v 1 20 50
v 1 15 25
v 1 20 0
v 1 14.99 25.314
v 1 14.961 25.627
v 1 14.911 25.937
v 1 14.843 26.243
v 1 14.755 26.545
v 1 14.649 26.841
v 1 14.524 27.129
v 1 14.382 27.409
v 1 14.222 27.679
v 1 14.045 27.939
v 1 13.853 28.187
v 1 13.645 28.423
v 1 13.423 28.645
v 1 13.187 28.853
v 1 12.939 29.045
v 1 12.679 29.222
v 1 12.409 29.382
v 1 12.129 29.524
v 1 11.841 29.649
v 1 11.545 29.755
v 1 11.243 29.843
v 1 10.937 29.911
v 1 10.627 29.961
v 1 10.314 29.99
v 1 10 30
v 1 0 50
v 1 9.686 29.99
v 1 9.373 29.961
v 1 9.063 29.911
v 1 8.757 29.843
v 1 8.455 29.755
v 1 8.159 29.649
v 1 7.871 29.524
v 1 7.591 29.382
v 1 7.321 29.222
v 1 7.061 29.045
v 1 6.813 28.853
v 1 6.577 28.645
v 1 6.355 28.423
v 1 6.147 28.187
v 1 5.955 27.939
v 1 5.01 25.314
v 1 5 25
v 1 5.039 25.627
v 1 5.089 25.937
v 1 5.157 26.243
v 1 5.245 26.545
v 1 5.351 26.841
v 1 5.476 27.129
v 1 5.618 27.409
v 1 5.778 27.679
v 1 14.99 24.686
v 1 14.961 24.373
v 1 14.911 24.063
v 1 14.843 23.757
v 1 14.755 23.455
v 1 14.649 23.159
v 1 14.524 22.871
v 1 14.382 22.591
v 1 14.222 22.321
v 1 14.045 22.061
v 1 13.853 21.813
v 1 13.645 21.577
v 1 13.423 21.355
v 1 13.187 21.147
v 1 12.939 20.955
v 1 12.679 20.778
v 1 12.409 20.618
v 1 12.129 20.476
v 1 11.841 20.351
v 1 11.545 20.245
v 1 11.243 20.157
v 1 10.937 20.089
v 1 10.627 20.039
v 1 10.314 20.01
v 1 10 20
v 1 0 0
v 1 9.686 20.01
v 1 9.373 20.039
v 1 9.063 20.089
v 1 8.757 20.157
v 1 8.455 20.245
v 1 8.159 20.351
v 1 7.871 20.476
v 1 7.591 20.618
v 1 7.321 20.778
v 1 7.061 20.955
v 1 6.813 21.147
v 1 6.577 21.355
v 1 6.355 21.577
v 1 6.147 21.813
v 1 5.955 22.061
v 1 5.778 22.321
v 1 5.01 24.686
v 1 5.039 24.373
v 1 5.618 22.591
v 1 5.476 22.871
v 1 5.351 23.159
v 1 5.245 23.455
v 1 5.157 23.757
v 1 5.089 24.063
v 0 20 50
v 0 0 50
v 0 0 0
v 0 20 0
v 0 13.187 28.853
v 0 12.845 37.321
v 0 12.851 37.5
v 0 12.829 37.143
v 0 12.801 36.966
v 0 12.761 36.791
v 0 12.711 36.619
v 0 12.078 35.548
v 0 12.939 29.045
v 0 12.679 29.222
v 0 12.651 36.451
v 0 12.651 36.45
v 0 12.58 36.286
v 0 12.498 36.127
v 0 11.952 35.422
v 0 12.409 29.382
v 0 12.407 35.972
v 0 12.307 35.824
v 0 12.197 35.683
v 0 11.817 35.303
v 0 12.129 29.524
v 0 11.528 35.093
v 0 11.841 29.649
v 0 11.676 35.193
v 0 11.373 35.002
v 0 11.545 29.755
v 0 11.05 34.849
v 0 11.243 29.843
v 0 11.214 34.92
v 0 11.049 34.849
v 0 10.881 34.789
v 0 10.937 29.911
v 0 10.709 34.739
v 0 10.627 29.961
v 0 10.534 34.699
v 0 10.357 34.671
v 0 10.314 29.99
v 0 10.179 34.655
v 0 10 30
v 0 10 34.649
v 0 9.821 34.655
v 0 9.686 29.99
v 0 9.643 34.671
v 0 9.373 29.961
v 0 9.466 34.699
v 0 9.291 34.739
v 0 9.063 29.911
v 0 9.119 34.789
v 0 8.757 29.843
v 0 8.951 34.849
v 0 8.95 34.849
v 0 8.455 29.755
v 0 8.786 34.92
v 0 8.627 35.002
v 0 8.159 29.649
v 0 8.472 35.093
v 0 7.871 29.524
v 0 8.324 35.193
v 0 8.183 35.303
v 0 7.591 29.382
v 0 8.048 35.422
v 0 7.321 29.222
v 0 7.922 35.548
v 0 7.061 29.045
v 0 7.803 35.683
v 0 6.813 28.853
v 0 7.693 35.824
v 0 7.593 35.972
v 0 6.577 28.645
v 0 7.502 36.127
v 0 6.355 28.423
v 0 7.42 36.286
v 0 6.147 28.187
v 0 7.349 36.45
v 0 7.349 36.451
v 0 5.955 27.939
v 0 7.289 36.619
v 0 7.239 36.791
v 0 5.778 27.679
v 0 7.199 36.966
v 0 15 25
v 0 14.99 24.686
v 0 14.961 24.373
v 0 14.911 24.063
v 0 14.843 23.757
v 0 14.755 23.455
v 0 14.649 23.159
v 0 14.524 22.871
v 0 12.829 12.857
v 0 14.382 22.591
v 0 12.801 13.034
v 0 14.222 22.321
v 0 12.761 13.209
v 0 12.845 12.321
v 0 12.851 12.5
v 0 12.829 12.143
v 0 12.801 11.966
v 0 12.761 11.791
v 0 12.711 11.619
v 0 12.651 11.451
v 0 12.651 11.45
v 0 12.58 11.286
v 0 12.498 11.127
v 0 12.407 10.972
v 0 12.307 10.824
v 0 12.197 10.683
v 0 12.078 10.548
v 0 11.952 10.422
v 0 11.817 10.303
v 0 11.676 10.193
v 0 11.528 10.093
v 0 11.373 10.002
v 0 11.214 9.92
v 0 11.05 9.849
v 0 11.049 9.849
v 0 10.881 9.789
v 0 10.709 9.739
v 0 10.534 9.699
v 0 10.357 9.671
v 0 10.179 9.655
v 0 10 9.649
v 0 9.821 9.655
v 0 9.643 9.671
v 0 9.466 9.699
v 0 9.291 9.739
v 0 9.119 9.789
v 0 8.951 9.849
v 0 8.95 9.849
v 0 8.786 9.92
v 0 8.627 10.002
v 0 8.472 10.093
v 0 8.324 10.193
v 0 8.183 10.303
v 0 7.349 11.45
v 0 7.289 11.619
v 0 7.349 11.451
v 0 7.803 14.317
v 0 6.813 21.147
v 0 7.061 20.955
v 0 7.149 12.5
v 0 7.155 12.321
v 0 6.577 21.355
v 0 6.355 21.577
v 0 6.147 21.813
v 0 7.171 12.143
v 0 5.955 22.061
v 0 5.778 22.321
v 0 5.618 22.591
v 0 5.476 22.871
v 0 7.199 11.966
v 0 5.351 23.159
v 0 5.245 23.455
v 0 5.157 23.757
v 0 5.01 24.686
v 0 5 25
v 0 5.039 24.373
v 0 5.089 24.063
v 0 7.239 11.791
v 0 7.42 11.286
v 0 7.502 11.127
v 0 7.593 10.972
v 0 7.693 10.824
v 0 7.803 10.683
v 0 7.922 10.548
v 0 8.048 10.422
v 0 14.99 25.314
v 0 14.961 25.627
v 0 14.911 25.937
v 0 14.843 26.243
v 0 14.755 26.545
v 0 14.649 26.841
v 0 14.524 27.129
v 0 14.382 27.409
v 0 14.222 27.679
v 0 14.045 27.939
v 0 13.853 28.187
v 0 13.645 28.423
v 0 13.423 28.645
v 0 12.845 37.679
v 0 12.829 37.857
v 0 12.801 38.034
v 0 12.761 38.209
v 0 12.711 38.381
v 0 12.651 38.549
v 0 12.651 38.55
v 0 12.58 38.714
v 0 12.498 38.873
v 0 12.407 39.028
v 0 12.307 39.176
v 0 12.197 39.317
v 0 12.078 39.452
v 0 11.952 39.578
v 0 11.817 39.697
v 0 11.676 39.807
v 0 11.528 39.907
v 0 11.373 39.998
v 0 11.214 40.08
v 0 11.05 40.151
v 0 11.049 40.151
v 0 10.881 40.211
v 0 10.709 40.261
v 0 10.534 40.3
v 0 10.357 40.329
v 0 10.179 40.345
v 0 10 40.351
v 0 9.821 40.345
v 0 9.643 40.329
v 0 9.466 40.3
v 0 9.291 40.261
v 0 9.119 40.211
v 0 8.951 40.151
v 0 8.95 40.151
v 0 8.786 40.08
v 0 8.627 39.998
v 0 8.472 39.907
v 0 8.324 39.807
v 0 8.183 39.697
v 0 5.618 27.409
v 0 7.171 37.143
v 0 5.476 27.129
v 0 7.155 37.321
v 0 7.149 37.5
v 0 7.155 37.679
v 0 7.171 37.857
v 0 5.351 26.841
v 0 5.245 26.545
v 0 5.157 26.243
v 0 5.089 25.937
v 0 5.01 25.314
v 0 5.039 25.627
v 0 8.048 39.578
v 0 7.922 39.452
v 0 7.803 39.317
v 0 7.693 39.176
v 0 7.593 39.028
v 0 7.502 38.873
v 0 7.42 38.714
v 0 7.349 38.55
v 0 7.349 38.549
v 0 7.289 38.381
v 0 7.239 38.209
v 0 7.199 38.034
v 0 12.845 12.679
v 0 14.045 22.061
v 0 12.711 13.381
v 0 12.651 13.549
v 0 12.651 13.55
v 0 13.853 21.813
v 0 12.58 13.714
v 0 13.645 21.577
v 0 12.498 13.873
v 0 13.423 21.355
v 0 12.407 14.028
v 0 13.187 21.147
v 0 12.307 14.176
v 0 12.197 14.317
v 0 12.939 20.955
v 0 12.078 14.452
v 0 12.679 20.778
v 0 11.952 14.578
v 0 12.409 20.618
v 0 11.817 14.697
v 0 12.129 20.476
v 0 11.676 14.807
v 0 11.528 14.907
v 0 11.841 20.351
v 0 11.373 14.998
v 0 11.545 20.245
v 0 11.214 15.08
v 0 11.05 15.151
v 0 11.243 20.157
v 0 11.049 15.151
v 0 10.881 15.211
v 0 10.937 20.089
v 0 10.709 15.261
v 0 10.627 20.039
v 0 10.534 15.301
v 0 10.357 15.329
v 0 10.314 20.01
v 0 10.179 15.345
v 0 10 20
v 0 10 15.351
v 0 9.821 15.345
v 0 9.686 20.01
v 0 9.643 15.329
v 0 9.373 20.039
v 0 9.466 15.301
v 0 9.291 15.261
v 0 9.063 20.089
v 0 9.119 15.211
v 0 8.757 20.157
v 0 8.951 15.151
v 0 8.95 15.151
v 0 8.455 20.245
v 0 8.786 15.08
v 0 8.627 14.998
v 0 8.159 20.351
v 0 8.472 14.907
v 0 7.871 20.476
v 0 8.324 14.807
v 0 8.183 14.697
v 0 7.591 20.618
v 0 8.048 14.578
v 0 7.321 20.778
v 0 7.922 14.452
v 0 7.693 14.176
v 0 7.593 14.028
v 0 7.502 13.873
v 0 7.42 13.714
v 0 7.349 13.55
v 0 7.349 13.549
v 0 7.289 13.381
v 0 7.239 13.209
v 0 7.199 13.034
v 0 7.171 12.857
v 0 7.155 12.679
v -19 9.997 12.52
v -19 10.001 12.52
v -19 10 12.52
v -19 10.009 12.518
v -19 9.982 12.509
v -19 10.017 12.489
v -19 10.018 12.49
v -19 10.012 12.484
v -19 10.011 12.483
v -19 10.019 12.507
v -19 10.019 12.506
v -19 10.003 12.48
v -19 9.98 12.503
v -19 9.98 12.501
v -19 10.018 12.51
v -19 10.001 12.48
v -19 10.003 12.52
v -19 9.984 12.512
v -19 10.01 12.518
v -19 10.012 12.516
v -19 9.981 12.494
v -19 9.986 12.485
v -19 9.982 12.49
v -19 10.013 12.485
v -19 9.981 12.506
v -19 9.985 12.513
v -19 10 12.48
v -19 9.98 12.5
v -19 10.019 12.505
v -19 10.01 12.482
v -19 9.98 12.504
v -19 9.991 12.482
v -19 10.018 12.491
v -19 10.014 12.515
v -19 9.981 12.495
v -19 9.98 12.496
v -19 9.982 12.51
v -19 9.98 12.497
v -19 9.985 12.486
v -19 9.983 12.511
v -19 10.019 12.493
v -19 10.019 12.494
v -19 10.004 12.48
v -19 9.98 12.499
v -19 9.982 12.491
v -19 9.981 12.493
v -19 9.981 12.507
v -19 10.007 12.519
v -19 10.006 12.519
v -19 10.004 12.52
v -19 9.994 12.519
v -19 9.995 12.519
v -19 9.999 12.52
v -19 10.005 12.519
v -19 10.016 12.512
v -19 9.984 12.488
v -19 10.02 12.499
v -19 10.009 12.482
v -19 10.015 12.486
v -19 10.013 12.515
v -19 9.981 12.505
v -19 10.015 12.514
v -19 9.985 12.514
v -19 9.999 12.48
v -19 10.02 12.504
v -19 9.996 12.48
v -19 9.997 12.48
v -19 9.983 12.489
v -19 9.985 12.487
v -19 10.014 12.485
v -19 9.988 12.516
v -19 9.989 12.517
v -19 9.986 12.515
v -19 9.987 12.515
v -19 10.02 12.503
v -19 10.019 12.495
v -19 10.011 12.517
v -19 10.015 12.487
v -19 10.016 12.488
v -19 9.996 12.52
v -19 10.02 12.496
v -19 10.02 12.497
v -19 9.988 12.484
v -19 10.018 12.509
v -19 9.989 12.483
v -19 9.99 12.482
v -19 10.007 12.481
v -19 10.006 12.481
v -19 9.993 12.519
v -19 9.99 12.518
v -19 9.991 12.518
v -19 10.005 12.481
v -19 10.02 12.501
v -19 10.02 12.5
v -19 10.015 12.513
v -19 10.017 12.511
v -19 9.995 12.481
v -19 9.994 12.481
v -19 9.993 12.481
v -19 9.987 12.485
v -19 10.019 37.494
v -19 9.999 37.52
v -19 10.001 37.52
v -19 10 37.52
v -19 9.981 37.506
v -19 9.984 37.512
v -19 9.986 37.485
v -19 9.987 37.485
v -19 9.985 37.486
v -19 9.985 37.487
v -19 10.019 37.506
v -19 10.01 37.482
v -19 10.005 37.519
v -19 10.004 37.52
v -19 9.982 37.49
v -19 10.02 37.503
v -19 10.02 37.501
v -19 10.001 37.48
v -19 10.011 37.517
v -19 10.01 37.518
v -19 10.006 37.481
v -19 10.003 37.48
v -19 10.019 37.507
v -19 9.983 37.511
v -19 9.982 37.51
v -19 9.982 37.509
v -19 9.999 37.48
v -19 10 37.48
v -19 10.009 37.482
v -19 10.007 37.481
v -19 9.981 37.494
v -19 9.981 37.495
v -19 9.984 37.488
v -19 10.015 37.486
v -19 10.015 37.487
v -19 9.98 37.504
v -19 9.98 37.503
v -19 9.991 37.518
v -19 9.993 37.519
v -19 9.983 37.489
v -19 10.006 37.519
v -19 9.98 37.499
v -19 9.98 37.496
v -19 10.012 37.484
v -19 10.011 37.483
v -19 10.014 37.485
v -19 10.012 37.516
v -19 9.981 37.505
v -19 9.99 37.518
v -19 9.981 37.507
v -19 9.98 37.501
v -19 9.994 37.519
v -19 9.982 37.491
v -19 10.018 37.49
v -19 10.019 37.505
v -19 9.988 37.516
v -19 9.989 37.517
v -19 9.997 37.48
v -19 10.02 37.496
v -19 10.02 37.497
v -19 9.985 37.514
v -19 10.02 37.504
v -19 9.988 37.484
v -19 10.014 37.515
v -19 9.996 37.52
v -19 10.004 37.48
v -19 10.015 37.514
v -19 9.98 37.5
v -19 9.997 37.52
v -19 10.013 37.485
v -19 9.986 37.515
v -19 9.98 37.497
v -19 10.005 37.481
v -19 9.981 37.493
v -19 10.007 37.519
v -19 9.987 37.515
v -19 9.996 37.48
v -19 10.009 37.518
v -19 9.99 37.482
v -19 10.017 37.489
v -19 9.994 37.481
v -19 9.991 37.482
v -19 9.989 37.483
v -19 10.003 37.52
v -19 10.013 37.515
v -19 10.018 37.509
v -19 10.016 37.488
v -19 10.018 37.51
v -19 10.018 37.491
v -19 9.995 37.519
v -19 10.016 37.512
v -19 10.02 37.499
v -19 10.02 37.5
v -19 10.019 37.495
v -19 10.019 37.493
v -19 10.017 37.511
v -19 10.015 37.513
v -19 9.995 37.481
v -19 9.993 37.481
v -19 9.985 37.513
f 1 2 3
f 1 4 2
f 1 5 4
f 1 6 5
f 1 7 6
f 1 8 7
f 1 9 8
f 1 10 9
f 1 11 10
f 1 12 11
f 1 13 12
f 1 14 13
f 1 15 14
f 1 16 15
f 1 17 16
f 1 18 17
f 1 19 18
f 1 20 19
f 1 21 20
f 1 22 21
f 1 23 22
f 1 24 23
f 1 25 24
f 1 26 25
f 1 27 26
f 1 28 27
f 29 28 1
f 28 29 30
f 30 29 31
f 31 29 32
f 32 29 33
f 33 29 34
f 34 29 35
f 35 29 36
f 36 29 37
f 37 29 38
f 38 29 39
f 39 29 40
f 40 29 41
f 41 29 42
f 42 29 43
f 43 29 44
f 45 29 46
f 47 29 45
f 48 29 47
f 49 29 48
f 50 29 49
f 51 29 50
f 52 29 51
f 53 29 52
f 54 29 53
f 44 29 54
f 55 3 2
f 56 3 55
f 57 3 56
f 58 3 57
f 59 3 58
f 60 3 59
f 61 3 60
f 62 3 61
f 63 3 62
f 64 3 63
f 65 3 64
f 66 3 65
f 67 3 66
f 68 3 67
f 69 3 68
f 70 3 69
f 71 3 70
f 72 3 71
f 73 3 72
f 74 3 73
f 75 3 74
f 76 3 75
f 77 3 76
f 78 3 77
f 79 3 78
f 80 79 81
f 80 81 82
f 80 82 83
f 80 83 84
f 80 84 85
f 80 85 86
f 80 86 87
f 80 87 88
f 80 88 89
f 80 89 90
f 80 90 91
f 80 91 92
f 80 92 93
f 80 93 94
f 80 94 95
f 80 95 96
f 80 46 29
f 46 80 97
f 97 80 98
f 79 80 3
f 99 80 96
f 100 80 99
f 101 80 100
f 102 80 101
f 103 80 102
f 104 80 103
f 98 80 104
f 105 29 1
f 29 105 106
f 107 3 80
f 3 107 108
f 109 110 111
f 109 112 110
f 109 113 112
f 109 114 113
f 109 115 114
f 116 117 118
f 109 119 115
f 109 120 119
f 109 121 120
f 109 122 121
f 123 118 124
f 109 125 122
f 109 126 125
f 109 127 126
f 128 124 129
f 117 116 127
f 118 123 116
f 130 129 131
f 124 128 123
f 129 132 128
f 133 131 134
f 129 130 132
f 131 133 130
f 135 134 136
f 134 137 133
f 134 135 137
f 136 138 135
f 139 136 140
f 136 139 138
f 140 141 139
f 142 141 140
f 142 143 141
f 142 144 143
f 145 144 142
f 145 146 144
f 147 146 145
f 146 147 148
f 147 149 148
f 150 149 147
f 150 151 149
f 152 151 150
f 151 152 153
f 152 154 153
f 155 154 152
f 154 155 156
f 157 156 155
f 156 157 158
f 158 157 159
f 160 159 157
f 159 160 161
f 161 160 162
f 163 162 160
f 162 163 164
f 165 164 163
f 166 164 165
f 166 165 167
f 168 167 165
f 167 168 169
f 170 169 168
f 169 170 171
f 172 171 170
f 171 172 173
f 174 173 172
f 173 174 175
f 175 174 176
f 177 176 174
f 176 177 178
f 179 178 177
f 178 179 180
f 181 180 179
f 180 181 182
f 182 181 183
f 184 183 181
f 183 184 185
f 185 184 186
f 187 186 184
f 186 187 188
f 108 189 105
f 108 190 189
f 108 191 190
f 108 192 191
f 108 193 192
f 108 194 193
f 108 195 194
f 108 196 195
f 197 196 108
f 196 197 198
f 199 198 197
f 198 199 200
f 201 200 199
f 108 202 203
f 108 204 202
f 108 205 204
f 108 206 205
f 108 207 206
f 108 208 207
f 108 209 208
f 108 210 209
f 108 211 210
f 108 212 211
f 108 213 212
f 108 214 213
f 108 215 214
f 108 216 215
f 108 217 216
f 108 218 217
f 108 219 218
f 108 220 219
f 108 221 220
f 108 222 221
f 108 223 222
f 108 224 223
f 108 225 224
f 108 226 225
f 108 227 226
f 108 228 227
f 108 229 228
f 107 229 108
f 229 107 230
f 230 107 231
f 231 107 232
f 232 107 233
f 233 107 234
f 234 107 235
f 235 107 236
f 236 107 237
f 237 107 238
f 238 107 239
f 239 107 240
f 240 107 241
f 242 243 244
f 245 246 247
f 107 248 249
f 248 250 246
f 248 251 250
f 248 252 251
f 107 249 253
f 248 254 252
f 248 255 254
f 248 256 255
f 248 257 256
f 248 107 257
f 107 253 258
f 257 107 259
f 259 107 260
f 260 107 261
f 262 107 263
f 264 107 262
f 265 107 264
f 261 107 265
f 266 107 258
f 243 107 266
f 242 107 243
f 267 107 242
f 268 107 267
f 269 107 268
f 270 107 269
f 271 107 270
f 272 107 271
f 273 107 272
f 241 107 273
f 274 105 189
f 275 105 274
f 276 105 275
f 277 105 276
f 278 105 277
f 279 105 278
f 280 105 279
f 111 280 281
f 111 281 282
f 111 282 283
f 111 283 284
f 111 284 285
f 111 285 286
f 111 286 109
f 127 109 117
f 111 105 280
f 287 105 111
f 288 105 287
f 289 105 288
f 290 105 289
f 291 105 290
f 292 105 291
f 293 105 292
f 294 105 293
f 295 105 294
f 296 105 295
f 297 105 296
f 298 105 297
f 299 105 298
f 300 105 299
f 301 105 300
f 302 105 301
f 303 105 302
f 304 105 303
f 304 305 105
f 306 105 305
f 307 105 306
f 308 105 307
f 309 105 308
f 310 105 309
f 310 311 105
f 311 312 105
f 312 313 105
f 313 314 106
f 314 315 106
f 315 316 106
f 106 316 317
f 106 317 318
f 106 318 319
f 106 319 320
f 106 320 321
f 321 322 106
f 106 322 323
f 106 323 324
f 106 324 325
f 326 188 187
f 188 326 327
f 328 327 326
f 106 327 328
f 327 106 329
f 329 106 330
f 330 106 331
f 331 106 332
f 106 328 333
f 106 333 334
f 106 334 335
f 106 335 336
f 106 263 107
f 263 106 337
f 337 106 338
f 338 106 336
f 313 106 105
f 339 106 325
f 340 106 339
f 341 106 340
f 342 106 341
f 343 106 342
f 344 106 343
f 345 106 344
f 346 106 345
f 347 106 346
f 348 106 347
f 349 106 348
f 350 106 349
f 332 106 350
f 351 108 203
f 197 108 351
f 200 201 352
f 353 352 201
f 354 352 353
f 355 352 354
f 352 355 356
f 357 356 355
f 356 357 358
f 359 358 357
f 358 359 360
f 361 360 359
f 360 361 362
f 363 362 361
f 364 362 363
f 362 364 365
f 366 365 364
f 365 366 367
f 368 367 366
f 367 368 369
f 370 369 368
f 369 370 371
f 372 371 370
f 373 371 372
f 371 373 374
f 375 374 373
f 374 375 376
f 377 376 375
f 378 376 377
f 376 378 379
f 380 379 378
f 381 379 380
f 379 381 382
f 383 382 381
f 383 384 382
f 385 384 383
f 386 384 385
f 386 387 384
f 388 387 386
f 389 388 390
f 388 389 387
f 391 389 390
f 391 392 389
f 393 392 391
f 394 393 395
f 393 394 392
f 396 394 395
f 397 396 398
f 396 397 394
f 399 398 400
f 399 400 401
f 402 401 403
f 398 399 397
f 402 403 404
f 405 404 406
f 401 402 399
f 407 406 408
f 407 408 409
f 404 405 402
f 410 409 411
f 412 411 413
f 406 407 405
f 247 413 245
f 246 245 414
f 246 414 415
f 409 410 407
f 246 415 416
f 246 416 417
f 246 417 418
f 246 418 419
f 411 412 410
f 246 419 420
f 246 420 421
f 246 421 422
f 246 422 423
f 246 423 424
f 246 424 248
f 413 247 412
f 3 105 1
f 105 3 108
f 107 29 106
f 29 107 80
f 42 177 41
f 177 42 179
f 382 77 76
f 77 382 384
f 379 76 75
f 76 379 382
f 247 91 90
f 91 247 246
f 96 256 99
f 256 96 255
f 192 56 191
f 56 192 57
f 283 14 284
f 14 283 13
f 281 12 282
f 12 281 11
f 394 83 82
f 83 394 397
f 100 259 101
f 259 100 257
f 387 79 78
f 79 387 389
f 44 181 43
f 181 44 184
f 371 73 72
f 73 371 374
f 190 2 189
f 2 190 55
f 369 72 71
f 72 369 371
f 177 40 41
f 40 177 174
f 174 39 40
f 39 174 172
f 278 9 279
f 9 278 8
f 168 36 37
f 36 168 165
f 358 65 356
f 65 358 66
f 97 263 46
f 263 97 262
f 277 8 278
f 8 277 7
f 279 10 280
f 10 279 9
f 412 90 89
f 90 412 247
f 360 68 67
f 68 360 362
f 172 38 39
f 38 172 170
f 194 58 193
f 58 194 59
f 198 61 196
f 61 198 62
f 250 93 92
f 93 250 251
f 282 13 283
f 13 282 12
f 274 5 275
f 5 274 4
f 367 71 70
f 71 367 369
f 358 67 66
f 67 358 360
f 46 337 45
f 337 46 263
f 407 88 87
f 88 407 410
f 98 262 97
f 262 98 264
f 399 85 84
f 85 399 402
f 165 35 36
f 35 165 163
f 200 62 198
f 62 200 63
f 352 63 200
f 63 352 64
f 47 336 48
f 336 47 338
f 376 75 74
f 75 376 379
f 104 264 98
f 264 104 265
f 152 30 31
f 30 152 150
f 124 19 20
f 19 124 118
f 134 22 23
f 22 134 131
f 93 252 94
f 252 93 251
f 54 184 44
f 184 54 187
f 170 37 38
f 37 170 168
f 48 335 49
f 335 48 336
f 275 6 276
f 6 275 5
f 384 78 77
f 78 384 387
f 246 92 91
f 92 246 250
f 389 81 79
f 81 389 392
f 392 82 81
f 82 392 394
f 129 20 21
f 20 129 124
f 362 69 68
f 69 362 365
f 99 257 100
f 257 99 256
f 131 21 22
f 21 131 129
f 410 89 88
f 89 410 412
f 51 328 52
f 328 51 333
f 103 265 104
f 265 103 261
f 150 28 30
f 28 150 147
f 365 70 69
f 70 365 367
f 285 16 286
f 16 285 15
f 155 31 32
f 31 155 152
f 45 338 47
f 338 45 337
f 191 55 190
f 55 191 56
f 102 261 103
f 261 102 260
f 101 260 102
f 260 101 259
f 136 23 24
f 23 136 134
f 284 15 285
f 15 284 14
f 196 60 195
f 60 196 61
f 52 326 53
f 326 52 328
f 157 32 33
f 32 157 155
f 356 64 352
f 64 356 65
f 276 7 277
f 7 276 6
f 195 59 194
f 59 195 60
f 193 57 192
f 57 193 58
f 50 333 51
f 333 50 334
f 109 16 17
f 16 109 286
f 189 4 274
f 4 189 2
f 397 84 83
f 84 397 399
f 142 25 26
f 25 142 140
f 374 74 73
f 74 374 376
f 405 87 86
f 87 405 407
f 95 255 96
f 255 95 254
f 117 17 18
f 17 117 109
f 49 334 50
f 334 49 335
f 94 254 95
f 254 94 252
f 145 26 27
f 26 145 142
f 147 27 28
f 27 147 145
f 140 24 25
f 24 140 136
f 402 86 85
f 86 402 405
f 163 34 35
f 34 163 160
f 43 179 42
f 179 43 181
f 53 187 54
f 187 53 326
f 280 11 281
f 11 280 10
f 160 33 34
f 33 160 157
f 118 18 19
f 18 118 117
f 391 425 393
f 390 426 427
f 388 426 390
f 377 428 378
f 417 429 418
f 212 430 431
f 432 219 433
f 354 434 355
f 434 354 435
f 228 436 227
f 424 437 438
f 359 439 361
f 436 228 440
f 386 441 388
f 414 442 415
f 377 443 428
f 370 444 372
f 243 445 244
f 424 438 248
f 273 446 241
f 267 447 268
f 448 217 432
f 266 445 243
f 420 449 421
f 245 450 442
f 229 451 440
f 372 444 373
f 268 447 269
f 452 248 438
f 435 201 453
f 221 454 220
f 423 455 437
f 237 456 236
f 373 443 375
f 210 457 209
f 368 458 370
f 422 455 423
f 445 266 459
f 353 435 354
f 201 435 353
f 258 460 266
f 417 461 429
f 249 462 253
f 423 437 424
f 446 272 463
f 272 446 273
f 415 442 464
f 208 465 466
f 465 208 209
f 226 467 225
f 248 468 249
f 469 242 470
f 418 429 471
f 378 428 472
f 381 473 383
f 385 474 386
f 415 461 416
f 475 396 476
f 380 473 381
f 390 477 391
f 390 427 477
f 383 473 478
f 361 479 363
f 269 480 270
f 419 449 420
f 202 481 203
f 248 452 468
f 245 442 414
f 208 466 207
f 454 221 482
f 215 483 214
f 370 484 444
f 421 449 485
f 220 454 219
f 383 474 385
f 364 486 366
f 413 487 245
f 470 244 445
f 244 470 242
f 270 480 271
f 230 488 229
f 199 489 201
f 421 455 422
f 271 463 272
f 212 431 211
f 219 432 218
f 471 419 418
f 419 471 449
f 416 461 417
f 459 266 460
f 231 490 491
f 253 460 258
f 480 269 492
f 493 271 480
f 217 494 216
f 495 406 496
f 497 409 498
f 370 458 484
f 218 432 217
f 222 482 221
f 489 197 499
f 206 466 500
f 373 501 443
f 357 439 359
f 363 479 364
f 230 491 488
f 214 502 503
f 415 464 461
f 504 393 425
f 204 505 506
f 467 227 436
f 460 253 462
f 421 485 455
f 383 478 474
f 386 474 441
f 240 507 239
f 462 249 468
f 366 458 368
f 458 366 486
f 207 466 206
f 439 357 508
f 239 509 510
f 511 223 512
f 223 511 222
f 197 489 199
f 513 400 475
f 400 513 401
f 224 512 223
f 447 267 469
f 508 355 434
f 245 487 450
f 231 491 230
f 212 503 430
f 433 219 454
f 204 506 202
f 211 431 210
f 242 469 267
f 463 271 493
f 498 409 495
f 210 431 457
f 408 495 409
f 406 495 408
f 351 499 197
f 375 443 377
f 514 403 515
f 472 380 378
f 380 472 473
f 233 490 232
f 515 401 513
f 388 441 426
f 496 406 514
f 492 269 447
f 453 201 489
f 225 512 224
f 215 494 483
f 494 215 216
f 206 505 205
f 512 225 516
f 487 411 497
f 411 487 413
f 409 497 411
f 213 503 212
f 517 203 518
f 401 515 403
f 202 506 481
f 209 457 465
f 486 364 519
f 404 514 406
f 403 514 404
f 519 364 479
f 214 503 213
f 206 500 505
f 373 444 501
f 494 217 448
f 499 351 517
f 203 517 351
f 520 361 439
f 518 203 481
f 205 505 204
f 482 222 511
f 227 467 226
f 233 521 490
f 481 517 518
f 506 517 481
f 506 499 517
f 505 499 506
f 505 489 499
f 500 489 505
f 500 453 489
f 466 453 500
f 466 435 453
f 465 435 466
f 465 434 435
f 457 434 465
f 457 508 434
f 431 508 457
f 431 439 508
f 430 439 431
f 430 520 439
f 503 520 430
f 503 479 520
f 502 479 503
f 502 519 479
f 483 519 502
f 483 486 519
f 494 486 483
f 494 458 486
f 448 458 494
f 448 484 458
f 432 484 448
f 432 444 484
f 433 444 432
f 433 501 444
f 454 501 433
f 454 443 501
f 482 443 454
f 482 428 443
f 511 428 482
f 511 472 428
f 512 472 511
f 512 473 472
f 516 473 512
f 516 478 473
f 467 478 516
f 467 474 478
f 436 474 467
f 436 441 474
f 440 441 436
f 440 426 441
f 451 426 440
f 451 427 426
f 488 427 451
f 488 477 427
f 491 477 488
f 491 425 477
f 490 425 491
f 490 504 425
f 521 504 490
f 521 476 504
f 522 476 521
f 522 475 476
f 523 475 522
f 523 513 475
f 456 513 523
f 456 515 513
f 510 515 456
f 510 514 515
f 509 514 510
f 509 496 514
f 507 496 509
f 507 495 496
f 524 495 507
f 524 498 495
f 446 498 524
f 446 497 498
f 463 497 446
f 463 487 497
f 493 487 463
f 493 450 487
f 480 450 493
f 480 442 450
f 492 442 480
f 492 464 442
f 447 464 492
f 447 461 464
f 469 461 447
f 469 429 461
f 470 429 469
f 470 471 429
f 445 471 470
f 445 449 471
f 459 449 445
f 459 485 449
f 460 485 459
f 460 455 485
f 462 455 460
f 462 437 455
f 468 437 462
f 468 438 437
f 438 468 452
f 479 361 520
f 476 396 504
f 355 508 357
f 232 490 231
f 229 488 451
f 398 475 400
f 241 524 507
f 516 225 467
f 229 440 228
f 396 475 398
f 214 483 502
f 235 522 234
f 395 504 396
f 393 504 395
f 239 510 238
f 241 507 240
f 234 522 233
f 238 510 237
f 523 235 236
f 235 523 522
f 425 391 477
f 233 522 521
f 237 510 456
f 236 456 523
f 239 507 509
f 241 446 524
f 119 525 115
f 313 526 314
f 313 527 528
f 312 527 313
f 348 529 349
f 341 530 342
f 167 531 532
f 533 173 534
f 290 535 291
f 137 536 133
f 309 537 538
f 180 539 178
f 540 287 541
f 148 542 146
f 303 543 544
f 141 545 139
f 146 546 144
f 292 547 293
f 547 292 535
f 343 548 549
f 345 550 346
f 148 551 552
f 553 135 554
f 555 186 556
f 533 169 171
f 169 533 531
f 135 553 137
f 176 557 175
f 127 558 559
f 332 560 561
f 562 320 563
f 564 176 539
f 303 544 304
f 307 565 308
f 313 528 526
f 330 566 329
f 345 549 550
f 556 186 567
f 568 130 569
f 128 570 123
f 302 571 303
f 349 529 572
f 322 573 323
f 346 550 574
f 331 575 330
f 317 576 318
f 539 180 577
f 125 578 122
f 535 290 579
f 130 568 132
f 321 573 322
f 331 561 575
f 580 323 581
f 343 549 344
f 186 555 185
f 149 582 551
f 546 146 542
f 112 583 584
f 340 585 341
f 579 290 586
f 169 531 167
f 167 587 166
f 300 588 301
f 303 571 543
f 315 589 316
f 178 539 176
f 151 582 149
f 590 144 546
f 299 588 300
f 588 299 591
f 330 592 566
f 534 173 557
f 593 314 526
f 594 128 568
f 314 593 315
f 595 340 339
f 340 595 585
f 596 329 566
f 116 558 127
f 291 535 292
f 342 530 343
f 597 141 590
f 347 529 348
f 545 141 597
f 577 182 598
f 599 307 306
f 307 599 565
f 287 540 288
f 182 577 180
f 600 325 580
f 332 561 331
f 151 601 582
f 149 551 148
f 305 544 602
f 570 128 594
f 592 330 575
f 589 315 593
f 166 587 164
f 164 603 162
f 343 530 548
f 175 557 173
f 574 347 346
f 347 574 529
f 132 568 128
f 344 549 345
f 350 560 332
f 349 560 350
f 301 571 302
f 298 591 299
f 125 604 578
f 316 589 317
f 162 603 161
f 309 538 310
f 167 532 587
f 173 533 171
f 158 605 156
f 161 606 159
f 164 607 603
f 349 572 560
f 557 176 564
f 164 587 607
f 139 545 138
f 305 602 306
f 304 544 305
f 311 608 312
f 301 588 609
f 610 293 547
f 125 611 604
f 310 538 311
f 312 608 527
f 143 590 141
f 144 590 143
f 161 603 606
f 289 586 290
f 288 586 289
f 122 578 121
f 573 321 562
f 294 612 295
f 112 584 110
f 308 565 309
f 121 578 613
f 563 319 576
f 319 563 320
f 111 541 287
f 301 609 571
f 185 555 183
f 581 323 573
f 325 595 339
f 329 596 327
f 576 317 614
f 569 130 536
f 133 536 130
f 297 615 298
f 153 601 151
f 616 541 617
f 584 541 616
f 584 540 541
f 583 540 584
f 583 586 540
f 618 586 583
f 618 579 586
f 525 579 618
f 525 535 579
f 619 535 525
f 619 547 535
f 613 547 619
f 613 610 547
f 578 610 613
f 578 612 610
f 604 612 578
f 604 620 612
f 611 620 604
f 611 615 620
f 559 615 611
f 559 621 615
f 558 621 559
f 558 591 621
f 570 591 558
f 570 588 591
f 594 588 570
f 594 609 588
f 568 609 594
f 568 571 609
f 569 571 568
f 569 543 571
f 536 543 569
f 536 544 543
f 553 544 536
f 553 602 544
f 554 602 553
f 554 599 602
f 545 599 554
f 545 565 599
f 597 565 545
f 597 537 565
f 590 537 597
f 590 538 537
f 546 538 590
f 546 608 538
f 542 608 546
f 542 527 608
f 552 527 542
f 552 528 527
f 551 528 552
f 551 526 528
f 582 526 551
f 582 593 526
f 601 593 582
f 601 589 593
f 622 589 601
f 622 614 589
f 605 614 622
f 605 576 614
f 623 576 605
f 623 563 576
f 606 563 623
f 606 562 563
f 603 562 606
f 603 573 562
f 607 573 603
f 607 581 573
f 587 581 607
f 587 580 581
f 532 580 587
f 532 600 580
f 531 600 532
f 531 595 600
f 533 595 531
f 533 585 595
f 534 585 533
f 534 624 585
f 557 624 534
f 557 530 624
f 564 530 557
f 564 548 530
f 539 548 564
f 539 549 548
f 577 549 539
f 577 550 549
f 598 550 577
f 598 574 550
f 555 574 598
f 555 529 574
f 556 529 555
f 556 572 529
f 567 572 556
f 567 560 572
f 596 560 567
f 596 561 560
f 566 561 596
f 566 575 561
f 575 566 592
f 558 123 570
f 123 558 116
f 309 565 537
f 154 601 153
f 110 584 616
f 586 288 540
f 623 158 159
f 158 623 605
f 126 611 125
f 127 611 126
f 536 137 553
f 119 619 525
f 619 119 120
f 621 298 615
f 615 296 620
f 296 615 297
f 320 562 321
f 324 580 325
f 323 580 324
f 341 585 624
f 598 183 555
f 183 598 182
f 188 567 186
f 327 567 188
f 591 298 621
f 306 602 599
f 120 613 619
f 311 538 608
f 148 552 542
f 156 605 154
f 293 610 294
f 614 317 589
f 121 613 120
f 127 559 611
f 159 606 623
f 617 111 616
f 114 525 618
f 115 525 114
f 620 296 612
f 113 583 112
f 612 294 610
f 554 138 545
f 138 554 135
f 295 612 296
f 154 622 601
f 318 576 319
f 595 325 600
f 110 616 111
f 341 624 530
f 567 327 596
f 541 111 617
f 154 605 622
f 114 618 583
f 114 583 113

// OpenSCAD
foam_thickness = 50;

bracket_width = 1;
bracket_depth = 20;
bracket_height = foam_thickness;

spike_height = 20;
spike_bottom_r = 3;
spike_top_r = .02;

$fn = 100;

difference() {
    cube([bracket_width, bracket_depth, bracket_height]);
    translate([0, (bracket_depth / 2), (bracket_height / 2)]) {
        rotate([0, 90, 0]) {
            cylinder(h = 100, r = 5, $fn = 100);
        }
    }
}

// MATH FOR SPIKE PLACEMENT
spike_x_offset = (bracket_height / 4);

translate([bracket_width, (bracket_depth / 2), spike_x_offset]) {
    rotate([0, -90, 0]) {
        cylinder(spike_height, spike_bottom_r, spike_top_r);
    }
}

translate([bracket_width, (bracket_depth / 2), (bracket_height - spike_x_offset)]) {
    rotate([0, -90, 0]) {
        cylinder(spike_height, spike_bottom_r, spike_top_r);
    }
}
